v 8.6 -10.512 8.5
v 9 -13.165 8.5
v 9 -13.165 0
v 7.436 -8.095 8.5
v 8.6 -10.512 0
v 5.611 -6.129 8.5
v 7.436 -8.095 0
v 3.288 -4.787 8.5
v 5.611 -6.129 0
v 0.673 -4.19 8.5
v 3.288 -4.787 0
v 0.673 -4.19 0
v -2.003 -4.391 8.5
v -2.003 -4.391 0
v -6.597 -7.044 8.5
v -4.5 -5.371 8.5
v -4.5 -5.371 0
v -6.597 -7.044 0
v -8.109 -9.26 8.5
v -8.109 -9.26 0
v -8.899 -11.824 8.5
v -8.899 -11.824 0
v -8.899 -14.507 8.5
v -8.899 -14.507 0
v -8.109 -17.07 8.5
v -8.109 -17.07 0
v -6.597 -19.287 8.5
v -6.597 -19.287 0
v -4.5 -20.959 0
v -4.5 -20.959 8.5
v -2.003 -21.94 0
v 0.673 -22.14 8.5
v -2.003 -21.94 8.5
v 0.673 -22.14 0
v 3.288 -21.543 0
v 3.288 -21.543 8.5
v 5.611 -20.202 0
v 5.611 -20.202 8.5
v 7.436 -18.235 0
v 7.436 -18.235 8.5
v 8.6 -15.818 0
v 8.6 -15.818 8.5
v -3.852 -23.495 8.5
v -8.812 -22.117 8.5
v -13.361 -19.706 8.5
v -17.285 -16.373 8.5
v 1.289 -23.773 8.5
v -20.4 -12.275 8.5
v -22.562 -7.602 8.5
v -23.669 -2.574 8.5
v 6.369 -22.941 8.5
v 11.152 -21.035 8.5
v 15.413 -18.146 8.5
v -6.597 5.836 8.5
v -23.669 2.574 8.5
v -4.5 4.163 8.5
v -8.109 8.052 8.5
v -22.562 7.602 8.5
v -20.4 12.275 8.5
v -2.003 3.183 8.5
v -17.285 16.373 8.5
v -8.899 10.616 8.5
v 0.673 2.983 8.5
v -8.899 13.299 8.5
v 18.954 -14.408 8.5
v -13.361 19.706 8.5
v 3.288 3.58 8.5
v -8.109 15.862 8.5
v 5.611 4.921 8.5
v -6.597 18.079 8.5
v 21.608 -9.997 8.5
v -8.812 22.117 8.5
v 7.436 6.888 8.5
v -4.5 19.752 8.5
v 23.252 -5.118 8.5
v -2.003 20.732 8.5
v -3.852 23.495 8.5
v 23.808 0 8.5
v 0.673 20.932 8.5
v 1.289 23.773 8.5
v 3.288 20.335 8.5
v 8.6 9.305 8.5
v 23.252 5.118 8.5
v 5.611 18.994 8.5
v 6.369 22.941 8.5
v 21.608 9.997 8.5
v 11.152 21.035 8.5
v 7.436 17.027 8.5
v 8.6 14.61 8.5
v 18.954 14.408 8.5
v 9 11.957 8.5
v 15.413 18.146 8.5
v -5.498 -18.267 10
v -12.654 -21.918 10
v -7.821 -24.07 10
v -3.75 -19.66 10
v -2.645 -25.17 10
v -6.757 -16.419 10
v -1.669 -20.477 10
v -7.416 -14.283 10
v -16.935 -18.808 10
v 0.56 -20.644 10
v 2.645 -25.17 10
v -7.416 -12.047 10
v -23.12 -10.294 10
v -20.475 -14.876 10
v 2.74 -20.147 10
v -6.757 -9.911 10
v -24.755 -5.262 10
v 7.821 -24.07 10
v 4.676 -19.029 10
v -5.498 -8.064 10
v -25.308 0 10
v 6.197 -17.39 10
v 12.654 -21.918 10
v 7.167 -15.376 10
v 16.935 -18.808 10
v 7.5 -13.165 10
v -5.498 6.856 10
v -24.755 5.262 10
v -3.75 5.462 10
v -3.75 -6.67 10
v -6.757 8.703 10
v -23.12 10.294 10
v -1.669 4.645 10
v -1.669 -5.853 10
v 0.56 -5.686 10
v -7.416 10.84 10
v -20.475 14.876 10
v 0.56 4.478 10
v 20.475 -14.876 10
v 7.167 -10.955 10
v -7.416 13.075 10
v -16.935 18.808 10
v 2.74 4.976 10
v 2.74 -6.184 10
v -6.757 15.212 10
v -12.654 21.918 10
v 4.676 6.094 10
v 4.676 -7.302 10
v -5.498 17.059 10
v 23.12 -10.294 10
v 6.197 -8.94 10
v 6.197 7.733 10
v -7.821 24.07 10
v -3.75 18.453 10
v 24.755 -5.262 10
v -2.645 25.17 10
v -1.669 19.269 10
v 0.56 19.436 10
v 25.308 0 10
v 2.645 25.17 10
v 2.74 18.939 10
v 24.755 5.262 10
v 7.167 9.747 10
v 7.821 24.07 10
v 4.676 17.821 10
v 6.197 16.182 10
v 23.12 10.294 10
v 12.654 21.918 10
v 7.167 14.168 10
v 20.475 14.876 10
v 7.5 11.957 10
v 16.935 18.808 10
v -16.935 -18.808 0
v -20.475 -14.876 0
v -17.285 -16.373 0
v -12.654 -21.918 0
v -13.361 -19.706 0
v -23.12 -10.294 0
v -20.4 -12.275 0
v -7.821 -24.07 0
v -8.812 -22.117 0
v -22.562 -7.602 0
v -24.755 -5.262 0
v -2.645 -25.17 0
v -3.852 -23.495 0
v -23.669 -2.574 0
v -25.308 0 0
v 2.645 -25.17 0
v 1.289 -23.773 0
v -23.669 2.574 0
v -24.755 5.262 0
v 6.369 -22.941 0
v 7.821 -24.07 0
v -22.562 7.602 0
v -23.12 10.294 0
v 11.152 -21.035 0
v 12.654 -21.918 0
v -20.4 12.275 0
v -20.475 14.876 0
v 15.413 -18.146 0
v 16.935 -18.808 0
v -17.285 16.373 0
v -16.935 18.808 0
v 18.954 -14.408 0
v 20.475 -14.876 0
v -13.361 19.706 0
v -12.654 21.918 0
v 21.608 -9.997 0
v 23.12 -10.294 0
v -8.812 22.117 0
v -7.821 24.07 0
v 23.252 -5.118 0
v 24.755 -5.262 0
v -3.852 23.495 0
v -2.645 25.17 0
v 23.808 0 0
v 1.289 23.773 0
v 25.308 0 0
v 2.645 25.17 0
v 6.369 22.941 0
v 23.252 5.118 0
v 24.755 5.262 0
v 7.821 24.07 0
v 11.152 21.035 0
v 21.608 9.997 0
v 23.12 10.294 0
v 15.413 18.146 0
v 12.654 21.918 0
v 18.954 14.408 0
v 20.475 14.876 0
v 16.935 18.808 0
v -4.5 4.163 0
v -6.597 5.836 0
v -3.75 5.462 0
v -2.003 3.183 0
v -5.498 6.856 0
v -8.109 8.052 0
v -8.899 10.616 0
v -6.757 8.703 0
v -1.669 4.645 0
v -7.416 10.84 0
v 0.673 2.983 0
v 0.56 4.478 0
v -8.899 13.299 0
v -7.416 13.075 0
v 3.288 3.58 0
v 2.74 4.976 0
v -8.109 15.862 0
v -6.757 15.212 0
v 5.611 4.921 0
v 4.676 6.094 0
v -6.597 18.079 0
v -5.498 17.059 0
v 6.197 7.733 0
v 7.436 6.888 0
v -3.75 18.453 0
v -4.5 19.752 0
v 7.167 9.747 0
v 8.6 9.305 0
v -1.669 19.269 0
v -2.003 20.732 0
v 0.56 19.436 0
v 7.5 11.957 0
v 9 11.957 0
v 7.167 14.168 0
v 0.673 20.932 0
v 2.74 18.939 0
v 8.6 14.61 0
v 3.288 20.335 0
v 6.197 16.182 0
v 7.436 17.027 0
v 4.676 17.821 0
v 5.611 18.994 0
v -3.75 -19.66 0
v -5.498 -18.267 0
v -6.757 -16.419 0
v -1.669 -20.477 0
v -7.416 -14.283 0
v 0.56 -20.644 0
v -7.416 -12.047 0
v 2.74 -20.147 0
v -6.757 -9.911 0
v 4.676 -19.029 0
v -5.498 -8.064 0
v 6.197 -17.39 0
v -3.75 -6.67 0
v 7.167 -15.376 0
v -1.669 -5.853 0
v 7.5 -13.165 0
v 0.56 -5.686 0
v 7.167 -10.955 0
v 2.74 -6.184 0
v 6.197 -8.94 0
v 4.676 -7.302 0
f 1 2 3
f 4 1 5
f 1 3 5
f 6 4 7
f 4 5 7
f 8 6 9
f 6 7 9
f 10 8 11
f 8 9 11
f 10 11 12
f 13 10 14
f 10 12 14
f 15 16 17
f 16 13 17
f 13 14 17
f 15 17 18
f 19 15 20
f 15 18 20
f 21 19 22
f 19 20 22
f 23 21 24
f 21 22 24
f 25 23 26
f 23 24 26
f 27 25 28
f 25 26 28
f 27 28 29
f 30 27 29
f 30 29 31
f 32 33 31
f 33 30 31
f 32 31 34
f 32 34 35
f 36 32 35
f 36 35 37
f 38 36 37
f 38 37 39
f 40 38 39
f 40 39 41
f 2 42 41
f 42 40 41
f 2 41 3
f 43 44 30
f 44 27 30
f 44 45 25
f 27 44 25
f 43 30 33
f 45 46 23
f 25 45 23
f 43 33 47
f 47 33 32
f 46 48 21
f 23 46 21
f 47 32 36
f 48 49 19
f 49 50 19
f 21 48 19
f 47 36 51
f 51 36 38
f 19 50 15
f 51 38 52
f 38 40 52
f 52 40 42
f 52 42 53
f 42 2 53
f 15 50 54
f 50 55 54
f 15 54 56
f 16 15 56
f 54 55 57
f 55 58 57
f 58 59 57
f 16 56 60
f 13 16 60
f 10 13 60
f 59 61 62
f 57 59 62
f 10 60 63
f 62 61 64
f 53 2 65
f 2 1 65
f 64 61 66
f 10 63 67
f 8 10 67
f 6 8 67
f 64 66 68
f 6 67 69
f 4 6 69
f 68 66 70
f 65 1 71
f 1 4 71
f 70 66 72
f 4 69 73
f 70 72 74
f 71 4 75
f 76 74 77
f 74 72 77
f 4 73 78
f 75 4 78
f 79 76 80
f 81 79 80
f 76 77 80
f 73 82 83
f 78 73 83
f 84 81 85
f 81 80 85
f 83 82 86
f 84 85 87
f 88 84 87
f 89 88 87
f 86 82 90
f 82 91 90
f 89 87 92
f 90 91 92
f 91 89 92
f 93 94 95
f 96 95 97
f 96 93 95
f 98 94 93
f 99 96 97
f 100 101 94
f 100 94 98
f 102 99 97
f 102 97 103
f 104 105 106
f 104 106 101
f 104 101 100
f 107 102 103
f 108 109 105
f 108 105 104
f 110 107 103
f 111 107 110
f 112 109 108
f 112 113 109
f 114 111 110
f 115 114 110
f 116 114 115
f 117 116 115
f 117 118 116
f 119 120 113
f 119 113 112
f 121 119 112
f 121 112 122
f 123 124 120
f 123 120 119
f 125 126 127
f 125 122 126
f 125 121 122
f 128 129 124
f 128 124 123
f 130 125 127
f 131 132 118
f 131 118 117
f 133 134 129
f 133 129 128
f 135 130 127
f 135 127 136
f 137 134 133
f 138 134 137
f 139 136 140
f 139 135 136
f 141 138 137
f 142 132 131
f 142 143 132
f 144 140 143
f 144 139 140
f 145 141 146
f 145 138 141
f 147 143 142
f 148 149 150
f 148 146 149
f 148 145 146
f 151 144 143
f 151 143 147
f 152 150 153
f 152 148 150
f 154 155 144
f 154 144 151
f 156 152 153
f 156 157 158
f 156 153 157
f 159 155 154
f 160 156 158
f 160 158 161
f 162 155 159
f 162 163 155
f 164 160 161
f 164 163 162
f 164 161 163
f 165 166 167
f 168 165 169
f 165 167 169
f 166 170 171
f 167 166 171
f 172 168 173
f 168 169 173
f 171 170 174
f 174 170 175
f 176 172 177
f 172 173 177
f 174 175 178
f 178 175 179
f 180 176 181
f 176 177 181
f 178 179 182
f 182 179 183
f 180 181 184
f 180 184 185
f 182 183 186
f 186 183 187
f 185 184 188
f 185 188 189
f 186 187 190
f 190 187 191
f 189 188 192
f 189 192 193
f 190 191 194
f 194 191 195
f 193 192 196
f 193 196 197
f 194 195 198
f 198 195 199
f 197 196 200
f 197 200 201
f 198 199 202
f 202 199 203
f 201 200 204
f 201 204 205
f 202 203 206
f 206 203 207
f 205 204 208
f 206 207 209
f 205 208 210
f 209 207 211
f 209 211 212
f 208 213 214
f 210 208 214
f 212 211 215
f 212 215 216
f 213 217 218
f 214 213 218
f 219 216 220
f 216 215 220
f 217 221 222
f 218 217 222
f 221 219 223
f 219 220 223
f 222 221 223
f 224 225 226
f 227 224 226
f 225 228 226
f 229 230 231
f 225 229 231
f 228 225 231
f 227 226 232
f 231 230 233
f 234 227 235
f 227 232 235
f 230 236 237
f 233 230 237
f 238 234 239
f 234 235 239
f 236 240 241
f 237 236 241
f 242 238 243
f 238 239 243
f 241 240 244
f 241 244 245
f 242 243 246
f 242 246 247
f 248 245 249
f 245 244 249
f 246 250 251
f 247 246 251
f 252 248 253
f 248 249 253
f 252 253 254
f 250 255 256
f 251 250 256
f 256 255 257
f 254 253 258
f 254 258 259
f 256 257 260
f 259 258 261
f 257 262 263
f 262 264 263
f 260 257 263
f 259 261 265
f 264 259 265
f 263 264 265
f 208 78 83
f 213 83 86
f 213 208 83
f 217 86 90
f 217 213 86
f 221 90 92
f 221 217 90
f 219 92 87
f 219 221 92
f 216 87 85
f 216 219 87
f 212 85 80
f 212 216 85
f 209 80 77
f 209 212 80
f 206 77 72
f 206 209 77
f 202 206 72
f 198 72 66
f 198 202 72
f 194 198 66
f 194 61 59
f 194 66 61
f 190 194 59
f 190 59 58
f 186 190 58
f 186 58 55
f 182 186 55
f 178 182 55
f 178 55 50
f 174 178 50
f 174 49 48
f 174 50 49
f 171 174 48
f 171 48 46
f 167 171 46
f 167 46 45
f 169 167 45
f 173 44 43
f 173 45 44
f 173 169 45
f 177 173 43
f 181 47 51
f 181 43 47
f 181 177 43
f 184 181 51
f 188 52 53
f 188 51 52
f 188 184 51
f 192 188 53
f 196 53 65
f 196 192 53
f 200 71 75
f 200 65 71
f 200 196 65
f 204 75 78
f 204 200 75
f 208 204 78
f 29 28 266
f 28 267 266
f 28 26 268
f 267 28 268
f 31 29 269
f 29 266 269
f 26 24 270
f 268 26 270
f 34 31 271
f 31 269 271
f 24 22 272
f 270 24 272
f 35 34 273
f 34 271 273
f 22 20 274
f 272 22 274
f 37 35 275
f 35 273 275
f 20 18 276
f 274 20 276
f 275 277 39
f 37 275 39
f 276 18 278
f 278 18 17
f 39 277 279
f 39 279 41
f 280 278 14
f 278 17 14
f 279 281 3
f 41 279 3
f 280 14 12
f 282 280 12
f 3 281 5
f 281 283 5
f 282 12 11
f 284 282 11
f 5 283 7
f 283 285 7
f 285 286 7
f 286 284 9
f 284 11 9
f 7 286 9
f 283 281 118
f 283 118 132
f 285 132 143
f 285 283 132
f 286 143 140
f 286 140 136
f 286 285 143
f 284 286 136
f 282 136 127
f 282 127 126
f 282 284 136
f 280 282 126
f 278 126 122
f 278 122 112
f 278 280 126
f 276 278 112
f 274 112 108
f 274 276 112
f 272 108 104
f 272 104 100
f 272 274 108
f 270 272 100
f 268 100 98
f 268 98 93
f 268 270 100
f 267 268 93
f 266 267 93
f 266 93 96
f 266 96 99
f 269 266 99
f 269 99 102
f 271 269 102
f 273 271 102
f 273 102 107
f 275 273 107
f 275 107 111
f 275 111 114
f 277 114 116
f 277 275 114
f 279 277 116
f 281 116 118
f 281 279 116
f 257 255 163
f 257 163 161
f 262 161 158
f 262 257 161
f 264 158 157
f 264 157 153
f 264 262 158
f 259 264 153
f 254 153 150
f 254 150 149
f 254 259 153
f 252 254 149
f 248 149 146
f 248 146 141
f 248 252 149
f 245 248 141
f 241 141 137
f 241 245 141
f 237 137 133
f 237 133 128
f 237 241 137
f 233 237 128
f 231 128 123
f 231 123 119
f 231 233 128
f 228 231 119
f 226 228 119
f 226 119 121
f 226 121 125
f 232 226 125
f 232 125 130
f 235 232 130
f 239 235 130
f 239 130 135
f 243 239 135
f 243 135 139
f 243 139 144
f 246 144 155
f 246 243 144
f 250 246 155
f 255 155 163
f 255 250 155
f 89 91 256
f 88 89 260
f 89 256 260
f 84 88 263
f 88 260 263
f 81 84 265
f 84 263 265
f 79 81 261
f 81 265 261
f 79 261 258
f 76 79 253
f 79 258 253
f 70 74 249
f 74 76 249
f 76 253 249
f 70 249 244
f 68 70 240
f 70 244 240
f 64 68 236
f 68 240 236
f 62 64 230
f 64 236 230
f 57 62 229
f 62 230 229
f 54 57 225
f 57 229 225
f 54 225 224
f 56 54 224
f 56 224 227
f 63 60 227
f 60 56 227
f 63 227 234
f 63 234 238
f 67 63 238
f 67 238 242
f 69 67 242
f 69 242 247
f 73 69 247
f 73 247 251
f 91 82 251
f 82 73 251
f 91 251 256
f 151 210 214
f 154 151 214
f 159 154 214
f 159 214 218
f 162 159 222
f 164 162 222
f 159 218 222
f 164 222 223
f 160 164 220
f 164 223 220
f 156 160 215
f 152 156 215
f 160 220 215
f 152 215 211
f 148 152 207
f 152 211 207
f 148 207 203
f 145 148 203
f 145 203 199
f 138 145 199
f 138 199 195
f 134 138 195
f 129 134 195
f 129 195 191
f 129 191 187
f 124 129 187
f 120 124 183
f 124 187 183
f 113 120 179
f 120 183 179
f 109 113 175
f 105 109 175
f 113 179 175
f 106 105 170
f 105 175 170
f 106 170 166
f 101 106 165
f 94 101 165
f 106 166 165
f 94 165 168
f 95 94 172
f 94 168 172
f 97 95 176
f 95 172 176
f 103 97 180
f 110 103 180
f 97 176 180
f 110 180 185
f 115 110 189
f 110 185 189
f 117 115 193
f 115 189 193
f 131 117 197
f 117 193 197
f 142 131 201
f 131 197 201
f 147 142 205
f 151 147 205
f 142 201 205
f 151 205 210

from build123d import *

# Parameters (mm, degrees)
F0_R     = 25.308413
F0_R_2   = 7.5
F1_DEPTH = 10
F2_T     = -1.5


with BuildPart() as f1:
    # F0 (on Top) → F1 (new body)
    with BuildSketch(Plane.XY):
        Circle(F0_R)
        with Locations((0, -13.165262)):
            Circle(F0_R_2, mode=Mode.SUBTRACT)
        with Locations((0, 11.95744)):
            Circle(F0_R_2, mode=Mode.SUBTRACT)
    extrude(amount=F1_DEPTH)

    # F2
    f2_openings = [f1.faces().sort_by_distance(p)[0] for p in [
        (0, 0.12867, 0),
    ]]
    offset(amount=F2_T, openings=f2_openings)


solid = f1.part
